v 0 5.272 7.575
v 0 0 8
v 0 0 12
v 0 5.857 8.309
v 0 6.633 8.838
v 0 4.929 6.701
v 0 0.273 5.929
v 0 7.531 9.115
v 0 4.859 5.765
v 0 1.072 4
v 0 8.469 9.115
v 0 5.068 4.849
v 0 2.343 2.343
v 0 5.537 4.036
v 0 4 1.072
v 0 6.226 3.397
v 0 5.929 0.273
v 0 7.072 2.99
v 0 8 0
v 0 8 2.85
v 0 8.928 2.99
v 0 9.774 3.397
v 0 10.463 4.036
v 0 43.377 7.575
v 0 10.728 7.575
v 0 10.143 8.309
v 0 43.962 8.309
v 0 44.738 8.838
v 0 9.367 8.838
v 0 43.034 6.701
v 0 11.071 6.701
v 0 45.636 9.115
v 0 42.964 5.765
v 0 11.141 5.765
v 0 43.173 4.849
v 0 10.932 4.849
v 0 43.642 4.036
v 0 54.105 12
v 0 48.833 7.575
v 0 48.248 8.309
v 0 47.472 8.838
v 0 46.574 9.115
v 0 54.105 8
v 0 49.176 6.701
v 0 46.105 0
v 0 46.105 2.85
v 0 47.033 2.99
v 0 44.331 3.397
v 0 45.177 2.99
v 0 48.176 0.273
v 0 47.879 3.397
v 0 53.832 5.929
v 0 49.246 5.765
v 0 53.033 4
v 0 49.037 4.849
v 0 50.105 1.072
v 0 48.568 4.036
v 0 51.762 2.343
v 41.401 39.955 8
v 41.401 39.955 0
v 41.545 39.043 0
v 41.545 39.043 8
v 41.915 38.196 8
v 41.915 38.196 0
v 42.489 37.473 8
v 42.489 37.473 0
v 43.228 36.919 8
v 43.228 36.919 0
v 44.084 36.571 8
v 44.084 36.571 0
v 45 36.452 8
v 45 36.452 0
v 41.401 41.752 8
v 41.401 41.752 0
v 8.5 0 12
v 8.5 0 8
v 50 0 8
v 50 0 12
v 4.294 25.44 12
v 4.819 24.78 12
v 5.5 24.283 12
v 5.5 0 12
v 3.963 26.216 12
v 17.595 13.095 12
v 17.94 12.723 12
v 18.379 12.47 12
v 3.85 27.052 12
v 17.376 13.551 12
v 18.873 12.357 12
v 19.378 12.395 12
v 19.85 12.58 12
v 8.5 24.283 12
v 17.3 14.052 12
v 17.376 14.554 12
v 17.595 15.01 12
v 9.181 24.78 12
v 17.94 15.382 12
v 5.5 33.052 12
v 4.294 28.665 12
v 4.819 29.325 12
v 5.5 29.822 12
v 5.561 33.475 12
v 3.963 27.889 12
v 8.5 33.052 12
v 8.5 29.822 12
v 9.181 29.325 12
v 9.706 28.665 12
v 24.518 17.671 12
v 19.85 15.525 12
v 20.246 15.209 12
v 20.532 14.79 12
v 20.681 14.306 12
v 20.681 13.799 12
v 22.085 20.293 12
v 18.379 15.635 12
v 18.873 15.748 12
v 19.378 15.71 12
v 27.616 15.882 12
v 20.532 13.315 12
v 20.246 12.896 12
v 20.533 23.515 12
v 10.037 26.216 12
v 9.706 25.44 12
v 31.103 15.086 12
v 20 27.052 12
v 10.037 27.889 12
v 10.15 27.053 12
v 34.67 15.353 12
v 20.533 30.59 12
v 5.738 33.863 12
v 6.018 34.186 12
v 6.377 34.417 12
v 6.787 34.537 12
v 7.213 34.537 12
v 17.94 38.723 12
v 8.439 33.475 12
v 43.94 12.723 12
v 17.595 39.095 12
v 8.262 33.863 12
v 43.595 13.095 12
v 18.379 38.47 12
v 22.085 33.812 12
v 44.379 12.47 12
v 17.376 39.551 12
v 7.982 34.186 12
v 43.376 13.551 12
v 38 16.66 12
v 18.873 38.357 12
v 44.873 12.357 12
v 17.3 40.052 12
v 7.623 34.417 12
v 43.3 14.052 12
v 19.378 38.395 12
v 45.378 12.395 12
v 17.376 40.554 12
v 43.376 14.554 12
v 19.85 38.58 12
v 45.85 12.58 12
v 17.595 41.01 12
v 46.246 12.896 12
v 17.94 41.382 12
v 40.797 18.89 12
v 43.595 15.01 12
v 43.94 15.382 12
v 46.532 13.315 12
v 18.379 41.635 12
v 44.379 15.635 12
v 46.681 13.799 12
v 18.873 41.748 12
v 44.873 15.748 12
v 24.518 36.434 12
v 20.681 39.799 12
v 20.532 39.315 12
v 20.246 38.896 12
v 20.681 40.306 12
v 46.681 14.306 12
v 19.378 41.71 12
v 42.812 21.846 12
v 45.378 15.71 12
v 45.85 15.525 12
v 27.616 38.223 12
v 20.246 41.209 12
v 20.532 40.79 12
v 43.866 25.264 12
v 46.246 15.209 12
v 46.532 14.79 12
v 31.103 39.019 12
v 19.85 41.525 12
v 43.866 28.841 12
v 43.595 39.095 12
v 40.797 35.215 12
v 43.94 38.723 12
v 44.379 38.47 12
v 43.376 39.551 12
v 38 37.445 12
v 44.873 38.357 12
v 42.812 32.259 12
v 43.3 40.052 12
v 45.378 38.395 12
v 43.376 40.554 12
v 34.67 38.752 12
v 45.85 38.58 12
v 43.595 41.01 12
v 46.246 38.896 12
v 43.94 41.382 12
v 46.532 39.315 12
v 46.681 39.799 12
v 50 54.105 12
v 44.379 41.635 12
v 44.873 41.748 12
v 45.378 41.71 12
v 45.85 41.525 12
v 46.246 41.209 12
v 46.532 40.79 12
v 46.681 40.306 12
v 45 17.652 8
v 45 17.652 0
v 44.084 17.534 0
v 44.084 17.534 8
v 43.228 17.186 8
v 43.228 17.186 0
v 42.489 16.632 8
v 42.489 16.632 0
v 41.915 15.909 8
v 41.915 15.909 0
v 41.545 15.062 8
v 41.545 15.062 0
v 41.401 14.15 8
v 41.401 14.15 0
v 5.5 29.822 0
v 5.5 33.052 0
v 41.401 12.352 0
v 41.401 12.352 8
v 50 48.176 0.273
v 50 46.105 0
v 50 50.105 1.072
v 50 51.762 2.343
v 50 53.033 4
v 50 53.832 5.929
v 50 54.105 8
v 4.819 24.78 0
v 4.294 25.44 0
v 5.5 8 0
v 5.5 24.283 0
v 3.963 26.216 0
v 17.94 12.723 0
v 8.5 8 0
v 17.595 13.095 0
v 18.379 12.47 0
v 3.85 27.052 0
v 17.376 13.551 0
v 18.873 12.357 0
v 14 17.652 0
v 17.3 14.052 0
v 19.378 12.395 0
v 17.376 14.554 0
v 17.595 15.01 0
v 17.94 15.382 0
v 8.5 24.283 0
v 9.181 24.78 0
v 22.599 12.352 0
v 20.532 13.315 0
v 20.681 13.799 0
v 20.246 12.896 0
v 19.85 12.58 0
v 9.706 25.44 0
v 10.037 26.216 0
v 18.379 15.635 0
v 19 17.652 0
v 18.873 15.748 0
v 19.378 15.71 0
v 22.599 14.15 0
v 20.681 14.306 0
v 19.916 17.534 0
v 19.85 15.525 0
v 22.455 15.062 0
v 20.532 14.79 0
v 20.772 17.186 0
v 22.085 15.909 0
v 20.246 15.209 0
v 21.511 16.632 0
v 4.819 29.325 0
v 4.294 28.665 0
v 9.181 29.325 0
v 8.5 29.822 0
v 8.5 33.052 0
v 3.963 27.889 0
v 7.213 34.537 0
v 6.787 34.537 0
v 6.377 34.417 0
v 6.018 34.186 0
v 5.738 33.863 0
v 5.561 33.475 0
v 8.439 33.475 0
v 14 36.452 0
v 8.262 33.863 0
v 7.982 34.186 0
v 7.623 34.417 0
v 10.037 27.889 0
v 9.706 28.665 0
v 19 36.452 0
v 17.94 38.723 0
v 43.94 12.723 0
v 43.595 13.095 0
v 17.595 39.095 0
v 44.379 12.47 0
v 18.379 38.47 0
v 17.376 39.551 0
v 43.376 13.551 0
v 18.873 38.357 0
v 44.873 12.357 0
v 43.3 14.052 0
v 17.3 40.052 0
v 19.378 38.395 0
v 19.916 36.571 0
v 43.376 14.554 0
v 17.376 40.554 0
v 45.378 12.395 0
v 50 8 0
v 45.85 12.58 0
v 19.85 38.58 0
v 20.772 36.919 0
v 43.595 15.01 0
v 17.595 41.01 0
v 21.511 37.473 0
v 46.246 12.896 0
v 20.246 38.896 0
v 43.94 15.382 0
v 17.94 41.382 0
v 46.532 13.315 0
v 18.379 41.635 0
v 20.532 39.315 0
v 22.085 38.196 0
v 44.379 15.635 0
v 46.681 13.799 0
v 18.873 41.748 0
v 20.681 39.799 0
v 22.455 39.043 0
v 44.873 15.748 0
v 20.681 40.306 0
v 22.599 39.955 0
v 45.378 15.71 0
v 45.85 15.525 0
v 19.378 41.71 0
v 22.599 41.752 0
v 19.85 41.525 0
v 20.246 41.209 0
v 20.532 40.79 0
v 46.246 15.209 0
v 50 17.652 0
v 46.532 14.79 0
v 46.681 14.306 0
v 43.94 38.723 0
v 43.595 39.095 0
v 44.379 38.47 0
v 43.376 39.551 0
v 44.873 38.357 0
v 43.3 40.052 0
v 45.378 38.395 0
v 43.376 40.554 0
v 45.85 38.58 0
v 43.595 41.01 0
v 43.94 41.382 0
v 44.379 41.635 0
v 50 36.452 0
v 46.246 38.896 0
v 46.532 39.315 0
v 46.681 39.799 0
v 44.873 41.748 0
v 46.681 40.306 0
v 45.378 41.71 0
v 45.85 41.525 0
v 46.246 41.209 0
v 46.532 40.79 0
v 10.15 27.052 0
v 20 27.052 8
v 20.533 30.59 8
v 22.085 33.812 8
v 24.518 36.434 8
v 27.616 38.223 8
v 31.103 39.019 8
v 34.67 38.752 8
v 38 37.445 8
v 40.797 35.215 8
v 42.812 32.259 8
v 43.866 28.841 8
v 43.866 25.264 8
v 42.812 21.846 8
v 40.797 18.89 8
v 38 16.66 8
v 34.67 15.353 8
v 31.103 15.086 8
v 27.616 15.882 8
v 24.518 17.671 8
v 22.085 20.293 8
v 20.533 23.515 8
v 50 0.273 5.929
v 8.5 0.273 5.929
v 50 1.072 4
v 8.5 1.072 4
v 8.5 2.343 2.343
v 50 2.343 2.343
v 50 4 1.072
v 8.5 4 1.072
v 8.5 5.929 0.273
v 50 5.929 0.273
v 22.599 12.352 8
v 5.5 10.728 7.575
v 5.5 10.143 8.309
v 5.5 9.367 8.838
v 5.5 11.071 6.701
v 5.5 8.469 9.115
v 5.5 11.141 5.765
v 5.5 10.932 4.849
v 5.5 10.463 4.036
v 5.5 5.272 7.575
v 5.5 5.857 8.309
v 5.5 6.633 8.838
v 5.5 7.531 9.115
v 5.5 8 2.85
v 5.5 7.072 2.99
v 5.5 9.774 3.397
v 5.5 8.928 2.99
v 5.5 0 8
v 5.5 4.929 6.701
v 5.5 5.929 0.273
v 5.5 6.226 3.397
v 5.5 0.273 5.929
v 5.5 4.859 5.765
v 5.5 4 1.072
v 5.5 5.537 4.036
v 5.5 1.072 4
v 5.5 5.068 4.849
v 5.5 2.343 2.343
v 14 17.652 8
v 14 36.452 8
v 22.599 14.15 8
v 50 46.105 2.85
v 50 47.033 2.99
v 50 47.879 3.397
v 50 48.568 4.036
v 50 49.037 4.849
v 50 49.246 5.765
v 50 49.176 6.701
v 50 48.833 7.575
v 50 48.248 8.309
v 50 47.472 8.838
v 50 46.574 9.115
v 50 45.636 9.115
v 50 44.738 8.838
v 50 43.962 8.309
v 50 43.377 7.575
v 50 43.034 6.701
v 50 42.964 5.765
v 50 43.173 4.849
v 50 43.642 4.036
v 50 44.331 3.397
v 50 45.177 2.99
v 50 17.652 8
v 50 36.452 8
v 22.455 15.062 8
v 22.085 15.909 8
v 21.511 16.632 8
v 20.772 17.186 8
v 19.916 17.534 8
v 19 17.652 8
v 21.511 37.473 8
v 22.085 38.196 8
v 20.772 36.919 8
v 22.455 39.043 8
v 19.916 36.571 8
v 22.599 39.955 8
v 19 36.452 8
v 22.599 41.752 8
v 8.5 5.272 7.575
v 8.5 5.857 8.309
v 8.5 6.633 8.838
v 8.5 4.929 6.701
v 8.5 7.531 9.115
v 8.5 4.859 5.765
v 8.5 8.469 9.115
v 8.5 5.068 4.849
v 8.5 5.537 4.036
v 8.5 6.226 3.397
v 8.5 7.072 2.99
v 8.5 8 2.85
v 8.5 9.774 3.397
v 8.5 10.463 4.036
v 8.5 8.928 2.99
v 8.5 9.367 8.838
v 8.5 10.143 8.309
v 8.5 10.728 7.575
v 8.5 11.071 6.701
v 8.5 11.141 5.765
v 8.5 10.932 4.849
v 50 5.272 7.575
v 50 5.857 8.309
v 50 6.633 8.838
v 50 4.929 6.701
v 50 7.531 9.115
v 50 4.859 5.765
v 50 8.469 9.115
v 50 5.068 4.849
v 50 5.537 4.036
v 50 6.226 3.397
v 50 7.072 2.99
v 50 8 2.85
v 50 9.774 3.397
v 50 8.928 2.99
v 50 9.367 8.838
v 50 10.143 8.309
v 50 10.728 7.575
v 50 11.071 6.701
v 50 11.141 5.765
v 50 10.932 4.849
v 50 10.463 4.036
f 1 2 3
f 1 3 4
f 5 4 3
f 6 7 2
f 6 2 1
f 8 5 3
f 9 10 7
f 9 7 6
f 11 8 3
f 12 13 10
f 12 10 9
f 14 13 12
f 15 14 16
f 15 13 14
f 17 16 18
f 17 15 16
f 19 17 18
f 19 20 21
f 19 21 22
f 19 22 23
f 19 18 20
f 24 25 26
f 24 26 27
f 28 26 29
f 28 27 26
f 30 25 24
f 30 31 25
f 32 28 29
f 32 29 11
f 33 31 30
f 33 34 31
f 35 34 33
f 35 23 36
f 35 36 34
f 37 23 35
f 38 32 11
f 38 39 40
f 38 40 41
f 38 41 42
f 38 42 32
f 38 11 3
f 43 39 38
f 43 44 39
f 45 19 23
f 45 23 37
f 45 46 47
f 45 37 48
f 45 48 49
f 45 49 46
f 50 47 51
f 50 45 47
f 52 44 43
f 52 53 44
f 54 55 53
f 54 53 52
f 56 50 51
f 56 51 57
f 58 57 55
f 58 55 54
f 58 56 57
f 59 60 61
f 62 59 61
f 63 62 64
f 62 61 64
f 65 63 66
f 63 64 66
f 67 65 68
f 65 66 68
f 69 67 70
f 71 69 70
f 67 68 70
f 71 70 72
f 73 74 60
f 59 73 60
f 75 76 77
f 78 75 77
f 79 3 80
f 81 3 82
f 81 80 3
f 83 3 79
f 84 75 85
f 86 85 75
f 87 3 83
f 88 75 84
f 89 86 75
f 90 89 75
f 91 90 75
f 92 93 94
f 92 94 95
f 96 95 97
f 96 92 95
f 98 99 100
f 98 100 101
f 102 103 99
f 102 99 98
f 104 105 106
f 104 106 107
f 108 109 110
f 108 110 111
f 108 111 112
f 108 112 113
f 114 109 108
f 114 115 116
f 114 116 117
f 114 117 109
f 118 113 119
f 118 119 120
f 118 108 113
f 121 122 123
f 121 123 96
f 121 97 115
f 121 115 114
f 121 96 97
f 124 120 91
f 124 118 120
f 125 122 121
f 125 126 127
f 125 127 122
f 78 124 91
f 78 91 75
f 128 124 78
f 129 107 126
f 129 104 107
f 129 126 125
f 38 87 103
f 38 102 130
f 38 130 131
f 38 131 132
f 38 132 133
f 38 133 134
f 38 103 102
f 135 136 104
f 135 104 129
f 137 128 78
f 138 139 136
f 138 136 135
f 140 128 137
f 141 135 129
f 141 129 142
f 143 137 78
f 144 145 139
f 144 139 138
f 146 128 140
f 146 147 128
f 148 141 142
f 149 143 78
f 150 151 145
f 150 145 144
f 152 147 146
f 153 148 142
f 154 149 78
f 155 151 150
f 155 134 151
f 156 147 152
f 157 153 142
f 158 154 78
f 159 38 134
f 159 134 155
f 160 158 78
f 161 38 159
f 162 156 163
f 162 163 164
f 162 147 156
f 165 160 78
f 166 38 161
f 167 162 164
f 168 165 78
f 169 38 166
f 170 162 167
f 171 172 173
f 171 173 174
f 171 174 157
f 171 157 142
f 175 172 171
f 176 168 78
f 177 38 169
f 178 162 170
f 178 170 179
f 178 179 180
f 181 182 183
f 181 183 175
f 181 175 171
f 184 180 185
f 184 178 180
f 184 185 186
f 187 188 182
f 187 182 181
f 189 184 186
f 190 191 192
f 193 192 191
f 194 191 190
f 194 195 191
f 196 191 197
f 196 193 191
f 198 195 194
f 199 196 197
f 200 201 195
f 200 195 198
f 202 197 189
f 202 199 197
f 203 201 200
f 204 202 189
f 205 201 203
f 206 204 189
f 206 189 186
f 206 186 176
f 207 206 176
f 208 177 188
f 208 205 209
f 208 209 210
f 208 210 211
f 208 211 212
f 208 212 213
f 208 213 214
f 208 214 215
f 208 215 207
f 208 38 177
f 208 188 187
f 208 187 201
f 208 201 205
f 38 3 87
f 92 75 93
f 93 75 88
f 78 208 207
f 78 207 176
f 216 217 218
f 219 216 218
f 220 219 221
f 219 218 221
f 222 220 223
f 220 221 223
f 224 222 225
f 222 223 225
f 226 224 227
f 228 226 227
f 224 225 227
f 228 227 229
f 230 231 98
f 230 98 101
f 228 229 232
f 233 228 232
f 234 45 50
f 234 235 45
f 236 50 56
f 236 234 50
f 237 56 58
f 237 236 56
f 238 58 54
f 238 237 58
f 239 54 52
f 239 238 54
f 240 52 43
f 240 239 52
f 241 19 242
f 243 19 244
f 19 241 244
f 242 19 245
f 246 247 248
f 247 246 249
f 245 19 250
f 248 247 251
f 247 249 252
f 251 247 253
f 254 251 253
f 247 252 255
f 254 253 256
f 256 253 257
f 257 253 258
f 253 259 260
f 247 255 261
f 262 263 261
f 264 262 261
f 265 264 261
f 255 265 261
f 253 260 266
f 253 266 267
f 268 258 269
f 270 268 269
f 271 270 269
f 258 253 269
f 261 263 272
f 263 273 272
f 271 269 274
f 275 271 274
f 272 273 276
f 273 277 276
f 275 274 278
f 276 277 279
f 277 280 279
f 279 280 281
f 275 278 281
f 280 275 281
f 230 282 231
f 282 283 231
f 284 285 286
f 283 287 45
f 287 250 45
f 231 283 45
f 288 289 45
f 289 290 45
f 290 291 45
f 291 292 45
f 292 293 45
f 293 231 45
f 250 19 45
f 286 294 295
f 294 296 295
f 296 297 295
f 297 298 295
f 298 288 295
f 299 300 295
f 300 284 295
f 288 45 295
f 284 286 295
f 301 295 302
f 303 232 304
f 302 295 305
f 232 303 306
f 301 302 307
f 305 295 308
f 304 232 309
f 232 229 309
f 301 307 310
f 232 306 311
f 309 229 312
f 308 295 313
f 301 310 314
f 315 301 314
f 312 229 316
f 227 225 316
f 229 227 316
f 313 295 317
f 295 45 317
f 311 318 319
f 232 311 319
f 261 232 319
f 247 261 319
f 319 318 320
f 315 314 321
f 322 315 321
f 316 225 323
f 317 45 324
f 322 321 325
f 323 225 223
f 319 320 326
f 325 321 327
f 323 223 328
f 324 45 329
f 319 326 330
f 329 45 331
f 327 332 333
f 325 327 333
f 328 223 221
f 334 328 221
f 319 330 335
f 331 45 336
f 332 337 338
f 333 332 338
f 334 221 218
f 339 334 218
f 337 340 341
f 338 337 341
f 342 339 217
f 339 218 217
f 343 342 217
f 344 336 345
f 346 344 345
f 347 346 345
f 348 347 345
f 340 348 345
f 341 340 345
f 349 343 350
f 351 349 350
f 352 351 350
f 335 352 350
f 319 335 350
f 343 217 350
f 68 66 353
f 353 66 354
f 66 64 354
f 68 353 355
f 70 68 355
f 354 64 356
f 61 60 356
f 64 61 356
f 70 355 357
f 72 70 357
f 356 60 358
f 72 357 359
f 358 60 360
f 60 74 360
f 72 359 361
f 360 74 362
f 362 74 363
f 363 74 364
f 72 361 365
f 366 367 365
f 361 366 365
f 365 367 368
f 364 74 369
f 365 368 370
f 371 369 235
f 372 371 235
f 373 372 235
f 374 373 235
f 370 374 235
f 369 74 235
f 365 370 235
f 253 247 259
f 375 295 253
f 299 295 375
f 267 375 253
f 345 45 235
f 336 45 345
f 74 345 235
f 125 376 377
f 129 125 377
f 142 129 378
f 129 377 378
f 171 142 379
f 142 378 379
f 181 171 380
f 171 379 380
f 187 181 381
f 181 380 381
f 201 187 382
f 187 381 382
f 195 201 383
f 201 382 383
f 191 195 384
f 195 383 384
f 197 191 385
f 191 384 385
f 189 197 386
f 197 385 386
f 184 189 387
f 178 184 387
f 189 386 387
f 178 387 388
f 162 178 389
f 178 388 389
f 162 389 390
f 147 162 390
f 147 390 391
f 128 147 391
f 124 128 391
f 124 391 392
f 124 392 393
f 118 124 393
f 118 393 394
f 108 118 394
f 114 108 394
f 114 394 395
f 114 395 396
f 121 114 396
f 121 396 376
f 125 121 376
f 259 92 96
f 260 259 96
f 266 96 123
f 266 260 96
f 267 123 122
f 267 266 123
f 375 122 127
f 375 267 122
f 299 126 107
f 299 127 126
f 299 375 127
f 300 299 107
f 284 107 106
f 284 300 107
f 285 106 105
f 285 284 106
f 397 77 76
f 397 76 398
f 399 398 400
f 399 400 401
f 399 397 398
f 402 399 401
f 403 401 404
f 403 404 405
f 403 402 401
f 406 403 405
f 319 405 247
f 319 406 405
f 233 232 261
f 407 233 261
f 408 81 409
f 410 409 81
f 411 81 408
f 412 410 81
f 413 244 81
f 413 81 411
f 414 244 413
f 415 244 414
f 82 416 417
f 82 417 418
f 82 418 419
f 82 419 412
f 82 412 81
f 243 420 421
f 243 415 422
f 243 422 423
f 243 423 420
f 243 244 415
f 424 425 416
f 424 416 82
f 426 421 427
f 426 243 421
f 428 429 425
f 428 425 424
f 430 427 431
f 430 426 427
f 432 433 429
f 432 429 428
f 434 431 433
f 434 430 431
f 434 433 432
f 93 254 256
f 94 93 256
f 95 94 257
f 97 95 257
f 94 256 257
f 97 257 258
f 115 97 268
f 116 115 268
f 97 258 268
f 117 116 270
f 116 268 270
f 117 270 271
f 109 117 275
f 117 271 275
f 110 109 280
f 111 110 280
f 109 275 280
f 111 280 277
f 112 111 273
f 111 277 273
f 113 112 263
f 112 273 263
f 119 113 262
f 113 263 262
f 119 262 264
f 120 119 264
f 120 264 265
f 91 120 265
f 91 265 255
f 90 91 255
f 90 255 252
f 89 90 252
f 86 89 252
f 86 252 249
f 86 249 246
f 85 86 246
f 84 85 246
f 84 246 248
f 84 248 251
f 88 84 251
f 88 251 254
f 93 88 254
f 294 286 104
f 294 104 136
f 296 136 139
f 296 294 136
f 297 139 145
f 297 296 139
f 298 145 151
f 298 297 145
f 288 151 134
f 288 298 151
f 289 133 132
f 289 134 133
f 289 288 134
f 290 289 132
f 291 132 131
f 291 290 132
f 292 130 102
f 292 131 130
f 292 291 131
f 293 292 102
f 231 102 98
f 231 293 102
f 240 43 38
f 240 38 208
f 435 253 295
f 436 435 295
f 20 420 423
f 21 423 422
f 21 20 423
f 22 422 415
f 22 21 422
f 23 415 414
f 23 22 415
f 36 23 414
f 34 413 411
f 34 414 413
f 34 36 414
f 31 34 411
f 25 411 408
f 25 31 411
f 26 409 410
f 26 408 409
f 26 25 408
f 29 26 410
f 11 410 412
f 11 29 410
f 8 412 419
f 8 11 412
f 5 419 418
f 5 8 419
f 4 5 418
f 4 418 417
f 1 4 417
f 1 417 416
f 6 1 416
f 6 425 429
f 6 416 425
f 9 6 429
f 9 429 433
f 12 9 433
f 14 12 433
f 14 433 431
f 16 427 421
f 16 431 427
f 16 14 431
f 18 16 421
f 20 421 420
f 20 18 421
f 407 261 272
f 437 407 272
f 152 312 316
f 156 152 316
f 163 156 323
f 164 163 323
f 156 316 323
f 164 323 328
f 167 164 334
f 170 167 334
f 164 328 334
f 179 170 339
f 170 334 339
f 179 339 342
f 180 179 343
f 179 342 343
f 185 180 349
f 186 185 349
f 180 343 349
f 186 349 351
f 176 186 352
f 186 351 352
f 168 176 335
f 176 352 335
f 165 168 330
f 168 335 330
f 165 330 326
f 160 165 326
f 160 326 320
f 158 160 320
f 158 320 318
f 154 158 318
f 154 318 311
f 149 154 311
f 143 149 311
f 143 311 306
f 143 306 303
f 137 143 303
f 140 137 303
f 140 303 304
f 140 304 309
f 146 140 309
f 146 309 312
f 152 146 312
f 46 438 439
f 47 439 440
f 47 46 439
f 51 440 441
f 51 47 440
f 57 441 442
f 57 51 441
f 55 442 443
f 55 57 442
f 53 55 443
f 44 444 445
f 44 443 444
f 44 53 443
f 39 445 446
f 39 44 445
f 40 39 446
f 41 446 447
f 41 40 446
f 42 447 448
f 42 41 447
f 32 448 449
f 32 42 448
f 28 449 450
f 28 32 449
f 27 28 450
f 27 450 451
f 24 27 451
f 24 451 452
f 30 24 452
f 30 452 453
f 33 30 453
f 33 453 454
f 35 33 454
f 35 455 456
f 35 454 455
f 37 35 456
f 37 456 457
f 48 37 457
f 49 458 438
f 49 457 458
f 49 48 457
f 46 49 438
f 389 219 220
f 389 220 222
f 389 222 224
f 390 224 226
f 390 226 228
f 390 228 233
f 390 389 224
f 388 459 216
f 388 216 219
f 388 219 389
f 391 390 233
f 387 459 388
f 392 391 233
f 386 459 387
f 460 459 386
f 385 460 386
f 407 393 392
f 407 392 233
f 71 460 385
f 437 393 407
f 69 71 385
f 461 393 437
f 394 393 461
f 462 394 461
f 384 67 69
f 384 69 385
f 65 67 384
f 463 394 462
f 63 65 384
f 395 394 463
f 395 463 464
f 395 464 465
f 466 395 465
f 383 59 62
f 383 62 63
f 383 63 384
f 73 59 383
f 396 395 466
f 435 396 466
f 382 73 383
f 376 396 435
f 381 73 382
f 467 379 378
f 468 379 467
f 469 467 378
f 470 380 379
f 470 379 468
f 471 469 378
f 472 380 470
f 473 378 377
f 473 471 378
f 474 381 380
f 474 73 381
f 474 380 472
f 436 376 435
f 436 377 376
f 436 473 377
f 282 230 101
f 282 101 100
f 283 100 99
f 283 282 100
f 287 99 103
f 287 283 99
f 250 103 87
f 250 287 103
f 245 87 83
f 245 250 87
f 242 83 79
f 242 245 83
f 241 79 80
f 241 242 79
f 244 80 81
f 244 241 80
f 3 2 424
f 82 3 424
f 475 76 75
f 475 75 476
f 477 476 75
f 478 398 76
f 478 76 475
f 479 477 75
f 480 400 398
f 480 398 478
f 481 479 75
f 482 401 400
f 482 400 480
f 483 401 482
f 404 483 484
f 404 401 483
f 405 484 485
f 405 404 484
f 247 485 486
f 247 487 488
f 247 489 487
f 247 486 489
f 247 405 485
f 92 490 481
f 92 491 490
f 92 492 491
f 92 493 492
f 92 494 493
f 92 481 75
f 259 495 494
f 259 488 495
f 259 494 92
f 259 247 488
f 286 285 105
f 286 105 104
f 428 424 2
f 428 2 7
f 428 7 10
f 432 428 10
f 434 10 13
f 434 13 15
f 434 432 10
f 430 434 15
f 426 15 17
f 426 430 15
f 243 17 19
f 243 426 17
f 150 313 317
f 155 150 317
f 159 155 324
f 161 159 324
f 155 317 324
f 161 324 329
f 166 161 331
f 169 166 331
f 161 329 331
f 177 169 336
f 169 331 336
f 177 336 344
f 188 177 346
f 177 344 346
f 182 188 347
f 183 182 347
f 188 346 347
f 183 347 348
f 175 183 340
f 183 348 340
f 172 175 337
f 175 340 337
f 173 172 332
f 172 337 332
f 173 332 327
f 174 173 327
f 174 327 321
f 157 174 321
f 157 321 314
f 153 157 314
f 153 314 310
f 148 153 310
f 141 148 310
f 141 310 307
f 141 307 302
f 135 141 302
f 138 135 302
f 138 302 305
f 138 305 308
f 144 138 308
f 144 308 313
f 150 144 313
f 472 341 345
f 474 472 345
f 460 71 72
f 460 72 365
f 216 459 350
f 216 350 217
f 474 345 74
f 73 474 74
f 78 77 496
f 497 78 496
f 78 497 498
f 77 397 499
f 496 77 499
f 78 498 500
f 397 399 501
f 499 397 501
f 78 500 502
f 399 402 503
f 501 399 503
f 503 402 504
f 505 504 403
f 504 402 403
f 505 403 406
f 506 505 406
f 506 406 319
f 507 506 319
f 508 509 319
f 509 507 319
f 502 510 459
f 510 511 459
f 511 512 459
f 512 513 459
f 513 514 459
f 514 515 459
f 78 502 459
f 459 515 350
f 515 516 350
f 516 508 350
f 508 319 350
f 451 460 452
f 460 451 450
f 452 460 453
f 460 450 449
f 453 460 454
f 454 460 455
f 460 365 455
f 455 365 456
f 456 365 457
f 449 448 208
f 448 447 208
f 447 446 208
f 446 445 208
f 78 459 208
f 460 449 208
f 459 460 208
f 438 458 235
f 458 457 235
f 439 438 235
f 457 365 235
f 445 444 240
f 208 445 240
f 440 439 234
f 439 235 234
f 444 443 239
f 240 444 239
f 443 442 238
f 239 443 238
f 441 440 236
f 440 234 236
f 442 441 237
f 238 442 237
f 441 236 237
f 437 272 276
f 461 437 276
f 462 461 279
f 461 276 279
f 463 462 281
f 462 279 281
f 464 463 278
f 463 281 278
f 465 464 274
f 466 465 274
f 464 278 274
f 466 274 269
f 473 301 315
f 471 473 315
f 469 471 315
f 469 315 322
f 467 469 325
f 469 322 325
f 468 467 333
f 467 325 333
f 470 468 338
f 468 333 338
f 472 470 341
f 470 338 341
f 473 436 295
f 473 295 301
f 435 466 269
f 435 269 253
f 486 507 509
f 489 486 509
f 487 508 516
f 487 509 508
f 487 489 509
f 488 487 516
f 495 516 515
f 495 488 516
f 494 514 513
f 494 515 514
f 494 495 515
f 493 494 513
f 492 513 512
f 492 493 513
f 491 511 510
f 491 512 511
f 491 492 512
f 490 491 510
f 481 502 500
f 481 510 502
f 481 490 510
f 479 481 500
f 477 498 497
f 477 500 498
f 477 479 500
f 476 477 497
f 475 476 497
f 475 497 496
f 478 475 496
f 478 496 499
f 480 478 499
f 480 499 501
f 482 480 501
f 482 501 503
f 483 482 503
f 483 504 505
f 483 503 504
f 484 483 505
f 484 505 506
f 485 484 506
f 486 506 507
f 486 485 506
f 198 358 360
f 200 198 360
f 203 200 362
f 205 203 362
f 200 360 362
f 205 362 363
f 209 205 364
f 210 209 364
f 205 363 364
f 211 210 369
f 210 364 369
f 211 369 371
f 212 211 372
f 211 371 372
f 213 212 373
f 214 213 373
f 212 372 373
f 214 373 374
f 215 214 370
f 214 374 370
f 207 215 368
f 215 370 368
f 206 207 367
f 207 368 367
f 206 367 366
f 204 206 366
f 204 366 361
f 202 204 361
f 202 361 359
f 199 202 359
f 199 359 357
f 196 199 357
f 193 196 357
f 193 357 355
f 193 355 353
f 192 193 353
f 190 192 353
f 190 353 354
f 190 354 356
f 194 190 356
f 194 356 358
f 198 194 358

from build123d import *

# Parameters (mm, degrees)
SKETCH1_W           = 50
SKETCH1_H           = 54.105
BOSS_EXTRUDE1_DEPTH = 12
SKETCH2_R           = 3.15
CUT_EXTRUDE1_DEPTH  = 51
FILLET1_R           = 8
SKETCH3_R           = 12
SKETCH3_R_2         = 1.7
CUT_EXTRUDE2_DEPTH  = 13
CUT_EXTRUDE4_DEPTH  = 8


with BuildPart() as part:
    # Sketch1 → Boss-Extrude1 (new body)
    with BuildSketch(Plane.XY):
        with Locations((25, 27.0525)):
            Rectangle(SKETCH1_W, SKETCH1_H)
    extrude(amount=BOSS_EXTRUDE1_DEPTH)

    # Sketch2 → Cut-Extrude1 (cut, through all)
    with BuildSketch(Plane(origin=(0, 0, 0), x_dir=(0, 0, -1), z_dir=(1, 0, 0))):
        with Locations((-6, 46.105)):
            Circle(SKETCH2_R)
        with Locations((-6, 8)):
            Circle(SKETCH2_R)
    extrude(amount=CUT_EXTRUDE1_DEPTH, mode=Mode.SUBTRACT)

    # Fillet1
    fillet1_edges = [part.edges().sort_by_distance(p)[0] for p in [
        (25, 54.105, 0),
        (25, 0, 0),
    ]]
    fillet(fillet1_edges, radius=FILLET1_R)

    # Sketch3 → Cut-Extrude2 (cut, through all)
    with BuildSketch(Plane(origin=(0, 0, 0), x_dir=(-1, 0, 0), z_dir=(0, 0, -1))):
        with Locations((-32, 27.0525)):
            Circle(SKETCH3_R)
        with Locations((-19, 40.0525)):
            Circle(SKETCH3_R_2)
        with Locations((-19, 14.0525)):
            Circle(SKETCH3_R_2)
        with Locations((-45, 14.0525)):
            Circle(SKETCH3_R_2)
        with Locations((-45, 40.0525)):
            Circle(SKETCH3_R_2)
        with BuildLine():
            Line((-8.5, 0), (-8.5, 24.282572203))
            ThreePointArc((-8.5, 24.282572203), (-10.15, 27.0525), (-8.5, 29.822427797))
            Line((-8.5, 29.822427797), (-8.5, 33.0525))
            ThreePointArc((-8.5, 33.0525), (-7, 34.5525), (-5.5, 33.0525))
            Line((-5.5, 33.0525), (-5.5, 29.822427797))
            ThreePointArc((-5.5, 29.822427797), (-3.85, 27.0525), (-5.5, 24.282572203))
            Line((-5.5, 24.282572203), (-5.5, 0))
            Line((-5.5, 0), (-8.5, 0))
        make_face()
    extrude(amount=-CUT_EXTRUDE2_DEPTH, mode=Mode.SUBTRACT)

    # Sketch5 → Cut-Extrude4 (cut)
    with BuildSketch(Plane(origin=(0, 0, 0), x_dir=(-1, 0, 0), z_dir=(0, 0, -1))):
        with BuildLine():
            Line((-19, 17.6525), (-14, 17.6525))
            Line((-14, 17.6525), (-14, 36.4525))
            Line((-14, 36.4525), (-19, 36.4525))
            ThreePointArc((-19, 36.4525), (-21.510876341, 37.472674425), (-22.598679445, 39.955))
            Line((-22.598679445, 39.955), (-22.598679445, 41.7525))
            Line((-22.598679445, 41.7525), (-41.401320555, 41.7525))
            Line((-41.401320555, 41.7525), (-41.401320555, 39.955))
            ThreePointArc((-41.401320555, 39.955), (-42.489123659, 37.472674425), (-45, 36.4525))
            Line((-45, 36.4525), (-50, 36.4525))
            Line((-50, 36.4525), (-50, 17.6525))
            Line((-50, 17.6525), (-45, 17.6525))
            ThreePointArc((-45, 17.6525), (-42.489123659, 16.632325575), (-41.401320555, 14.15))
            Line((-41.401320555, 14.15), (-41.401320555, 12.3525))
            Line((-41.401320555, 12.3525), (-22.598679445, 12.3525))
            Line((-22.598679445, 12.3525), (-22.598679445, 14.15))
            ThreePointArc((-22.598679445, 14.15), (-21.510876341, 16.632325575), (-19, 17.6525))
        make_face()
    extrude(amount=-CUT_EXTRUDE4_DEPTH, mode=Mode.SUBTRACT)


solid = part.part
